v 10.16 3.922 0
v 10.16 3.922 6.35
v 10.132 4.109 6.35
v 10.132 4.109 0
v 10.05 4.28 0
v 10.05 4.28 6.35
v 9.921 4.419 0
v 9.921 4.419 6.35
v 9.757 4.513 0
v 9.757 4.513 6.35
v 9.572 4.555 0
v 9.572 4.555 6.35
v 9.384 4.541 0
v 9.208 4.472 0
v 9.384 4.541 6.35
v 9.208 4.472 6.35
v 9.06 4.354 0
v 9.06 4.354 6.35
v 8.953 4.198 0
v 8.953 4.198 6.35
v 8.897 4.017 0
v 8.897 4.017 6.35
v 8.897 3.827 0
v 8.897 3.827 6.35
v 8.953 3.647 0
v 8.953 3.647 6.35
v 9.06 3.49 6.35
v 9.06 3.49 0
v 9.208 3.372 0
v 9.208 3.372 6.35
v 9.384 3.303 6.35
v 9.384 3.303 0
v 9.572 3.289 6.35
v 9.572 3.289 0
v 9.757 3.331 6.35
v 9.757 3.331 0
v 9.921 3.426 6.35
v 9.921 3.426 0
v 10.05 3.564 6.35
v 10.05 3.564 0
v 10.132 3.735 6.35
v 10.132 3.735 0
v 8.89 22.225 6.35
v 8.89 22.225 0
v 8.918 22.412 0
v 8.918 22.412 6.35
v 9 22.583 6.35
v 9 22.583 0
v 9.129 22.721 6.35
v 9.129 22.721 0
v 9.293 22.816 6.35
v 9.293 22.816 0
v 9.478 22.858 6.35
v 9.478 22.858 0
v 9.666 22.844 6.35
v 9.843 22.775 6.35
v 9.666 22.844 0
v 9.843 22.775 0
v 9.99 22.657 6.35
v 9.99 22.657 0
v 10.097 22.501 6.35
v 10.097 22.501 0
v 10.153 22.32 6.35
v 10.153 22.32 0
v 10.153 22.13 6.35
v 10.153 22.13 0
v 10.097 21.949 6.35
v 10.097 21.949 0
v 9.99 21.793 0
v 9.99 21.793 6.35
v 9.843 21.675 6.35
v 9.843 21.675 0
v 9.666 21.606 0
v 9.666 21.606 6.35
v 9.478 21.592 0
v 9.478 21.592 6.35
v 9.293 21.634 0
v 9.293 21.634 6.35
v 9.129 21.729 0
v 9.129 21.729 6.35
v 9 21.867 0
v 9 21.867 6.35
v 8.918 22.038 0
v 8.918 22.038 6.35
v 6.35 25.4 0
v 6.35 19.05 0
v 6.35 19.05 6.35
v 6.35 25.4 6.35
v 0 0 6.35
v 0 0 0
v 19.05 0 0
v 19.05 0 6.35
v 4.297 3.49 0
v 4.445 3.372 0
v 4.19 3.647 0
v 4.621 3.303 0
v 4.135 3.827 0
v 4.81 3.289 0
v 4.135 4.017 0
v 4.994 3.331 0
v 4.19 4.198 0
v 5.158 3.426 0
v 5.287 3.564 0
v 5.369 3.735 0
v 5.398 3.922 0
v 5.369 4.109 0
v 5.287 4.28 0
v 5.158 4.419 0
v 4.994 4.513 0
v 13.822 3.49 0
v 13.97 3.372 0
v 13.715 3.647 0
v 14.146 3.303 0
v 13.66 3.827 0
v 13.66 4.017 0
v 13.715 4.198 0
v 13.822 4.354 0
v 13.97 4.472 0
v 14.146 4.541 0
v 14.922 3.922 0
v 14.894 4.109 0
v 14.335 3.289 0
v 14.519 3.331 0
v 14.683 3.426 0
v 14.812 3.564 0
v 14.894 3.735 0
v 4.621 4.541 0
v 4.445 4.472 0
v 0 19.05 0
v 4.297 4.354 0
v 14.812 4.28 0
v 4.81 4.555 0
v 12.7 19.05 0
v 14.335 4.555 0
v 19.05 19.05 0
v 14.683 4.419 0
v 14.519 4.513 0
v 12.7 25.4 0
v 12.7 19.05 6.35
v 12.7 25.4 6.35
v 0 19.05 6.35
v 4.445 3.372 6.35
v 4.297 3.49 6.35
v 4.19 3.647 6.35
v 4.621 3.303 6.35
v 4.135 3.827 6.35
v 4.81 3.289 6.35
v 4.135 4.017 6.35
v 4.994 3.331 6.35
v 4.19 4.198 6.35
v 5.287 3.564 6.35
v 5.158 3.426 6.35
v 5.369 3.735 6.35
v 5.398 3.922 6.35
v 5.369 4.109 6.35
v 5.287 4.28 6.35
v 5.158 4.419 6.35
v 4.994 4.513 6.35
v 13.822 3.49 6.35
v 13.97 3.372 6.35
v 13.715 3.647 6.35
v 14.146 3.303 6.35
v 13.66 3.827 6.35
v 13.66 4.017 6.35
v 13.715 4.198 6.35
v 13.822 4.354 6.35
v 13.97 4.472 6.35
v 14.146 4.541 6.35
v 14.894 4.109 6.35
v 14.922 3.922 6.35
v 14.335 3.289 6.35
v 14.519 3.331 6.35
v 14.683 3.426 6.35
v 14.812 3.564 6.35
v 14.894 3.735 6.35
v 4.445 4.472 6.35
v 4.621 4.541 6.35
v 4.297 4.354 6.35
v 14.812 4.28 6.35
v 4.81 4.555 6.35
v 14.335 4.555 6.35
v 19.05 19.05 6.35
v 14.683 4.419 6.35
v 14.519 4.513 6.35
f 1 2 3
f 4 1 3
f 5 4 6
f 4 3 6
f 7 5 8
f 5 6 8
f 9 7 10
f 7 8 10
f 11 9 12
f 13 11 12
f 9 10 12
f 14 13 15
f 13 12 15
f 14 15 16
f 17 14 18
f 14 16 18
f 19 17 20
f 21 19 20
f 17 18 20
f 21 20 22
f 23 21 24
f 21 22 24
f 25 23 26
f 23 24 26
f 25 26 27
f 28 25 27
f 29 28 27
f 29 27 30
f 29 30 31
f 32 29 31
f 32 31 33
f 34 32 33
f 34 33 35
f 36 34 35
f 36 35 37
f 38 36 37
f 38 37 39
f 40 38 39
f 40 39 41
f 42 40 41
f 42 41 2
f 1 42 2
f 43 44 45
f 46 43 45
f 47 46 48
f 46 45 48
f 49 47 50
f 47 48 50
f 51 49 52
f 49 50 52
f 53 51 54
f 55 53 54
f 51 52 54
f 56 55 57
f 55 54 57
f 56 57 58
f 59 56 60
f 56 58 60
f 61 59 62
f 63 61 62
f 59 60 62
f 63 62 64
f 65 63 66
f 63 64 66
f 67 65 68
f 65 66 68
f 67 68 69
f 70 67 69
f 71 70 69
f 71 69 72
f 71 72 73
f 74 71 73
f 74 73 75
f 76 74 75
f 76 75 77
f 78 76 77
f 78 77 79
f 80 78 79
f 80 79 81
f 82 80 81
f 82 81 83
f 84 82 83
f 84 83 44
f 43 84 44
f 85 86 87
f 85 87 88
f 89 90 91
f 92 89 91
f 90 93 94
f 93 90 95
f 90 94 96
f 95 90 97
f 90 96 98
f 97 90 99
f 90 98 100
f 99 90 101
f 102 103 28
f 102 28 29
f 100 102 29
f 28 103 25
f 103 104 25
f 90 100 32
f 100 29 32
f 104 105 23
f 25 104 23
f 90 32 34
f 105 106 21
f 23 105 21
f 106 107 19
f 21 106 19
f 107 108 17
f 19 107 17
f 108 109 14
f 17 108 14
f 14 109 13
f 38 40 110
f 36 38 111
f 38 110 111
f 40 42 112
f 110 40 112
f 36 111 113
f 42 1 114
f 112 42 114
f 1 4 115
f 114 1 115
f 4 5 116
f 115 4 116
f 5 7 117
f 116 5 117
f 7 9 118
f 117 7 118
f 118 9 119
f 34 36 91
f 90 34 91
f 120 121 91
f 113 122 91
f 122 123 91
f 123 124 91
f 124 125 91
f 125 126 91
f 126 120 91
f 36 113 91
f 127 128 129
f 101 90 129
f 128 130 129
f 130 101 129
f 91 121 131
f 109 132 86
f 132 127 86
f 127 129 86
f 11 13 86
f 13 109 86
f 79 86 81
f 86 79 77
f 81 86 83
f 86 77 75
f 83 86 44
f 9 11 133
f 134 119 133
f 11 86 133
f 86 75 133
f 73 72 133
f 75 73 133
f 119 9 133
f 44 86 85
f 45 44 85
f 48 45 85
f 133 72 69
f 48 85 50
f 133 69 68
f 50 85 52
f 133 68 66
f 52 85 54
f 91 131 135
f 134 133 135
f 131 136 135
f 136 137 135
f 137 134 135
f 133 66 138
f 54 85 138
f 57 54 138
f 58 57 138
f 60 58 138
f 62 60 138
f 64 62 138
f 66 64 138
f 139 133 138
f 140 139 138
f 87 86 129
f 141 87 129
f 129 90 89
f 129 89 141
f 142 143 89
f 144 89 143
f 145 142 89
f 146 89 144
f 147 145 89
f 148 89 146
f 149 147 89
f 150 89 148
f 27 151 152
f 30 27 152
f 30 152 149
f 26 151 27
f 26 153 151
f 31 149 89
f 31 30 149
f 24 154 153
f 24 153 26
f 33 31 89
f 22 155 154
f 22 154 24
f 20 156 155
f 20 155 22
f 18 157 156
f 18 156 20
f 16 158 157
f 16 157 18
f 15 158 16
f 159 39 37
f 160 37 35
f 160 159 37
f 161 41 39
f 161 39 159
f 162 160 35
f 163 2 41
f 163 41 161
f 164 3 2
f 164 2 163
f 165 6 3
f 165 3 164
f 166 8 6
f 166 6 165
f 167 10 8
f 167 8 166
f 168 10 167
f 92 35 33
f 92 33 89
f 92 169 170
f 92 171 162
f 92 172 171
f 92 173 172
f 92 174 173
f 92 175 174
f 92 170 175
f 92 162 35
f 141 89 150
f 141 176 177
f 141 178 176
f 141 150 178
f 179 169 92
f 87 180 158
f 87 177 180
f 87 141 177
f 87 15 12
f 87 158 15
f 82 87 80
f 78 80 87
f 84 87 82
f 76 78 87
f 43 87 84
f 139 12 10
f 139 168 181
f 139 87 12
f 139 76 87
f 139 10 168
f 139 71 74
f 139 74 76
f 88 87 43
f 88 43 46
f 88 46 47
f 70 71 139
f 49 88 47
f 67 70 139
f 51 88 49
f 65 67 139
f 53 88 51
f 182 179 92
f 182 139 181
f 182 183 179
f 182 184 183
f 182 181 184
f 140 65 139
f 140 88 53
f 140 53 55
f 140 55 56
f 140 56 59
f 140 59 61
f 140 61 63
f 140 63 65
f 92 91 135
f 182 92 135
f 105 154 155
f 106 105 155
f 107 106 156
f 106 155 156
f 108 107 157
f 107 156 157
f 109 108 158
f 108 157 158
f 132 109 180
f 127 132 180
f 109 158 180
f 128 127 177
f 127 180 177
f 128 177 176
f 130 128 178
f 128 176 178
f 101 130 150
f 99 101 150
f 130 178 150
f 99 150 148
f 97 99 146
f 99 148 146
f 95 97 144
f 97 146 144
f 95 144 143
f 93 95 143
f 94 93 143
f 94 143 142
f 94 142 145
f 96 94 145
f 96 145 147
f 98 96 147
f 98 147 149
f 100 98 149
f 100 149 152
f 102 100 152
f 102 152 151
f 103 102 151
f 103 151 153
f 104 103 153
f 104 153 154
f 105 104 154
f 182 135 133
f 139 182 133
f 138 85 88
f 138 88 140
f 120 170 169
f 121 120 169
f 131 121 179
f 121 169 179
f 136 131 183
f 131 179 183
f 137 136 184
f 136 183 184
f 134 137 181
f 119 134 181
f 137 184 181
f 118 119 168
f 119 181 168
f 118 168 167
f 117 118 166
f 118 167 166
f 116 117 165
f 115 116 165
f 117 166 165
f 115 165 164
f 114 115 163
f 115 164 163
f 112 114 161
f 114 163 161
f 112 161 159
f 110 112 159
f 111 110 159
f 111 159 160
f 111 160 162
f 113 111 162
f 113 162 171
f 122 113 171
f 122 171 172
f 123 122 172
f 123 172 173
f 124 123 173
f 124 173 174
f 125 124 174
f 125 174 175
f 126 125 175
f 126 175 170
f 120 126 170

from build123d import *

# Parameters (mm, degrees)
SKETCH1_W           = 19.05
SKETCH1_H           = 25.4
BOSS_EXTRUDE1_DEPTH = 6.35
SKETCH2_W           = 6.35
SKETCH2_H           = 6.35
CUT_EXTRUDE1_DEPTH  = 7.35
SKETCH3_W           = 6.35
SKETCH3_H           = 6.35
CUT_EXTRUDE2_DEPTH  = 7.35
SKETCH4_R           = 0.635
CUT_EXTRUDE3_DEPTH  = 7.35
SKETCH5_R           = 0.635
CUT_EXTRUDE4_DEPTH  = 7.35


with BuildPart() as part:
    # Sketch1 → Boss-Extrude1 (new body)
    with BuildSketch(Plane.XY):
        with Locations((9.525, 12.7)):
            Rectangle(SKETCH1_W, SKETCH1_H)
    extrude(amount=BOSS_EXTRUDE1_DEPTH)

    # Sketch2 → Cut-Extrude1 (cut, through all)
    with BuildSketch(Plane(origin=(0, 0, 0), x_dir=(-1, 0, 0), z_dir=(0, 0, -1))):
        with Locations((-3.175, 22.225)):
            Rectangle(SKETCH2_W, SKETCH2_H)
    extrude(amount=-CUT_EXTRUDE1_DEPTH, mode=Mode.SUBTRACT)

    # Sketch3 → Cut-Extrude2 (cut, through all)
    with BuildSketch(Plane(origin=(0, 0, 0), x_dir=(-1, 0, 0), z_dir=(0, 0, -1))):
        with Locations((-15.875, 22.225)):
            Rectangle(SKETCH3_W, SKETCH3_H)
    extrude(amount=-CUT_EXTRUDE2_DEPTH, mode=Mode.SUBTRACT)

    # Sketch4 → Cut-Extrude3 (cut, through all)
    with BuildSketch(Plane(origin=(0, 0, 0), x_dir=(-1, 0, 0), z_dir=(0, 0, -1))):
        with Locations((-9.525, 22.225)):
            Circle(SKETCH4_R)
    extrude(amount=-CUT_EXTRUDE3_DEPTH, mode=Mode.SUBTRACT)

    # Sketch5 → Cut-Extrude4 (cut, through all)
    with BuildSketch(Plane.XY.offset(6.35)):
        with Locations((14.2875, 3.922050028)):
            Circle(SKETCH5_R)
        with Locations((9.525, 3.922050028)):
            Circle(SKETCH5_R)
        with Locations((4.7625, 3.922050028)):
            Circle(SKETCH5_R)
    extrude(amount=-CUT_EXTRUDE4_DEPTH, mode=Mode.SUBTRACT)


solid = part.part
